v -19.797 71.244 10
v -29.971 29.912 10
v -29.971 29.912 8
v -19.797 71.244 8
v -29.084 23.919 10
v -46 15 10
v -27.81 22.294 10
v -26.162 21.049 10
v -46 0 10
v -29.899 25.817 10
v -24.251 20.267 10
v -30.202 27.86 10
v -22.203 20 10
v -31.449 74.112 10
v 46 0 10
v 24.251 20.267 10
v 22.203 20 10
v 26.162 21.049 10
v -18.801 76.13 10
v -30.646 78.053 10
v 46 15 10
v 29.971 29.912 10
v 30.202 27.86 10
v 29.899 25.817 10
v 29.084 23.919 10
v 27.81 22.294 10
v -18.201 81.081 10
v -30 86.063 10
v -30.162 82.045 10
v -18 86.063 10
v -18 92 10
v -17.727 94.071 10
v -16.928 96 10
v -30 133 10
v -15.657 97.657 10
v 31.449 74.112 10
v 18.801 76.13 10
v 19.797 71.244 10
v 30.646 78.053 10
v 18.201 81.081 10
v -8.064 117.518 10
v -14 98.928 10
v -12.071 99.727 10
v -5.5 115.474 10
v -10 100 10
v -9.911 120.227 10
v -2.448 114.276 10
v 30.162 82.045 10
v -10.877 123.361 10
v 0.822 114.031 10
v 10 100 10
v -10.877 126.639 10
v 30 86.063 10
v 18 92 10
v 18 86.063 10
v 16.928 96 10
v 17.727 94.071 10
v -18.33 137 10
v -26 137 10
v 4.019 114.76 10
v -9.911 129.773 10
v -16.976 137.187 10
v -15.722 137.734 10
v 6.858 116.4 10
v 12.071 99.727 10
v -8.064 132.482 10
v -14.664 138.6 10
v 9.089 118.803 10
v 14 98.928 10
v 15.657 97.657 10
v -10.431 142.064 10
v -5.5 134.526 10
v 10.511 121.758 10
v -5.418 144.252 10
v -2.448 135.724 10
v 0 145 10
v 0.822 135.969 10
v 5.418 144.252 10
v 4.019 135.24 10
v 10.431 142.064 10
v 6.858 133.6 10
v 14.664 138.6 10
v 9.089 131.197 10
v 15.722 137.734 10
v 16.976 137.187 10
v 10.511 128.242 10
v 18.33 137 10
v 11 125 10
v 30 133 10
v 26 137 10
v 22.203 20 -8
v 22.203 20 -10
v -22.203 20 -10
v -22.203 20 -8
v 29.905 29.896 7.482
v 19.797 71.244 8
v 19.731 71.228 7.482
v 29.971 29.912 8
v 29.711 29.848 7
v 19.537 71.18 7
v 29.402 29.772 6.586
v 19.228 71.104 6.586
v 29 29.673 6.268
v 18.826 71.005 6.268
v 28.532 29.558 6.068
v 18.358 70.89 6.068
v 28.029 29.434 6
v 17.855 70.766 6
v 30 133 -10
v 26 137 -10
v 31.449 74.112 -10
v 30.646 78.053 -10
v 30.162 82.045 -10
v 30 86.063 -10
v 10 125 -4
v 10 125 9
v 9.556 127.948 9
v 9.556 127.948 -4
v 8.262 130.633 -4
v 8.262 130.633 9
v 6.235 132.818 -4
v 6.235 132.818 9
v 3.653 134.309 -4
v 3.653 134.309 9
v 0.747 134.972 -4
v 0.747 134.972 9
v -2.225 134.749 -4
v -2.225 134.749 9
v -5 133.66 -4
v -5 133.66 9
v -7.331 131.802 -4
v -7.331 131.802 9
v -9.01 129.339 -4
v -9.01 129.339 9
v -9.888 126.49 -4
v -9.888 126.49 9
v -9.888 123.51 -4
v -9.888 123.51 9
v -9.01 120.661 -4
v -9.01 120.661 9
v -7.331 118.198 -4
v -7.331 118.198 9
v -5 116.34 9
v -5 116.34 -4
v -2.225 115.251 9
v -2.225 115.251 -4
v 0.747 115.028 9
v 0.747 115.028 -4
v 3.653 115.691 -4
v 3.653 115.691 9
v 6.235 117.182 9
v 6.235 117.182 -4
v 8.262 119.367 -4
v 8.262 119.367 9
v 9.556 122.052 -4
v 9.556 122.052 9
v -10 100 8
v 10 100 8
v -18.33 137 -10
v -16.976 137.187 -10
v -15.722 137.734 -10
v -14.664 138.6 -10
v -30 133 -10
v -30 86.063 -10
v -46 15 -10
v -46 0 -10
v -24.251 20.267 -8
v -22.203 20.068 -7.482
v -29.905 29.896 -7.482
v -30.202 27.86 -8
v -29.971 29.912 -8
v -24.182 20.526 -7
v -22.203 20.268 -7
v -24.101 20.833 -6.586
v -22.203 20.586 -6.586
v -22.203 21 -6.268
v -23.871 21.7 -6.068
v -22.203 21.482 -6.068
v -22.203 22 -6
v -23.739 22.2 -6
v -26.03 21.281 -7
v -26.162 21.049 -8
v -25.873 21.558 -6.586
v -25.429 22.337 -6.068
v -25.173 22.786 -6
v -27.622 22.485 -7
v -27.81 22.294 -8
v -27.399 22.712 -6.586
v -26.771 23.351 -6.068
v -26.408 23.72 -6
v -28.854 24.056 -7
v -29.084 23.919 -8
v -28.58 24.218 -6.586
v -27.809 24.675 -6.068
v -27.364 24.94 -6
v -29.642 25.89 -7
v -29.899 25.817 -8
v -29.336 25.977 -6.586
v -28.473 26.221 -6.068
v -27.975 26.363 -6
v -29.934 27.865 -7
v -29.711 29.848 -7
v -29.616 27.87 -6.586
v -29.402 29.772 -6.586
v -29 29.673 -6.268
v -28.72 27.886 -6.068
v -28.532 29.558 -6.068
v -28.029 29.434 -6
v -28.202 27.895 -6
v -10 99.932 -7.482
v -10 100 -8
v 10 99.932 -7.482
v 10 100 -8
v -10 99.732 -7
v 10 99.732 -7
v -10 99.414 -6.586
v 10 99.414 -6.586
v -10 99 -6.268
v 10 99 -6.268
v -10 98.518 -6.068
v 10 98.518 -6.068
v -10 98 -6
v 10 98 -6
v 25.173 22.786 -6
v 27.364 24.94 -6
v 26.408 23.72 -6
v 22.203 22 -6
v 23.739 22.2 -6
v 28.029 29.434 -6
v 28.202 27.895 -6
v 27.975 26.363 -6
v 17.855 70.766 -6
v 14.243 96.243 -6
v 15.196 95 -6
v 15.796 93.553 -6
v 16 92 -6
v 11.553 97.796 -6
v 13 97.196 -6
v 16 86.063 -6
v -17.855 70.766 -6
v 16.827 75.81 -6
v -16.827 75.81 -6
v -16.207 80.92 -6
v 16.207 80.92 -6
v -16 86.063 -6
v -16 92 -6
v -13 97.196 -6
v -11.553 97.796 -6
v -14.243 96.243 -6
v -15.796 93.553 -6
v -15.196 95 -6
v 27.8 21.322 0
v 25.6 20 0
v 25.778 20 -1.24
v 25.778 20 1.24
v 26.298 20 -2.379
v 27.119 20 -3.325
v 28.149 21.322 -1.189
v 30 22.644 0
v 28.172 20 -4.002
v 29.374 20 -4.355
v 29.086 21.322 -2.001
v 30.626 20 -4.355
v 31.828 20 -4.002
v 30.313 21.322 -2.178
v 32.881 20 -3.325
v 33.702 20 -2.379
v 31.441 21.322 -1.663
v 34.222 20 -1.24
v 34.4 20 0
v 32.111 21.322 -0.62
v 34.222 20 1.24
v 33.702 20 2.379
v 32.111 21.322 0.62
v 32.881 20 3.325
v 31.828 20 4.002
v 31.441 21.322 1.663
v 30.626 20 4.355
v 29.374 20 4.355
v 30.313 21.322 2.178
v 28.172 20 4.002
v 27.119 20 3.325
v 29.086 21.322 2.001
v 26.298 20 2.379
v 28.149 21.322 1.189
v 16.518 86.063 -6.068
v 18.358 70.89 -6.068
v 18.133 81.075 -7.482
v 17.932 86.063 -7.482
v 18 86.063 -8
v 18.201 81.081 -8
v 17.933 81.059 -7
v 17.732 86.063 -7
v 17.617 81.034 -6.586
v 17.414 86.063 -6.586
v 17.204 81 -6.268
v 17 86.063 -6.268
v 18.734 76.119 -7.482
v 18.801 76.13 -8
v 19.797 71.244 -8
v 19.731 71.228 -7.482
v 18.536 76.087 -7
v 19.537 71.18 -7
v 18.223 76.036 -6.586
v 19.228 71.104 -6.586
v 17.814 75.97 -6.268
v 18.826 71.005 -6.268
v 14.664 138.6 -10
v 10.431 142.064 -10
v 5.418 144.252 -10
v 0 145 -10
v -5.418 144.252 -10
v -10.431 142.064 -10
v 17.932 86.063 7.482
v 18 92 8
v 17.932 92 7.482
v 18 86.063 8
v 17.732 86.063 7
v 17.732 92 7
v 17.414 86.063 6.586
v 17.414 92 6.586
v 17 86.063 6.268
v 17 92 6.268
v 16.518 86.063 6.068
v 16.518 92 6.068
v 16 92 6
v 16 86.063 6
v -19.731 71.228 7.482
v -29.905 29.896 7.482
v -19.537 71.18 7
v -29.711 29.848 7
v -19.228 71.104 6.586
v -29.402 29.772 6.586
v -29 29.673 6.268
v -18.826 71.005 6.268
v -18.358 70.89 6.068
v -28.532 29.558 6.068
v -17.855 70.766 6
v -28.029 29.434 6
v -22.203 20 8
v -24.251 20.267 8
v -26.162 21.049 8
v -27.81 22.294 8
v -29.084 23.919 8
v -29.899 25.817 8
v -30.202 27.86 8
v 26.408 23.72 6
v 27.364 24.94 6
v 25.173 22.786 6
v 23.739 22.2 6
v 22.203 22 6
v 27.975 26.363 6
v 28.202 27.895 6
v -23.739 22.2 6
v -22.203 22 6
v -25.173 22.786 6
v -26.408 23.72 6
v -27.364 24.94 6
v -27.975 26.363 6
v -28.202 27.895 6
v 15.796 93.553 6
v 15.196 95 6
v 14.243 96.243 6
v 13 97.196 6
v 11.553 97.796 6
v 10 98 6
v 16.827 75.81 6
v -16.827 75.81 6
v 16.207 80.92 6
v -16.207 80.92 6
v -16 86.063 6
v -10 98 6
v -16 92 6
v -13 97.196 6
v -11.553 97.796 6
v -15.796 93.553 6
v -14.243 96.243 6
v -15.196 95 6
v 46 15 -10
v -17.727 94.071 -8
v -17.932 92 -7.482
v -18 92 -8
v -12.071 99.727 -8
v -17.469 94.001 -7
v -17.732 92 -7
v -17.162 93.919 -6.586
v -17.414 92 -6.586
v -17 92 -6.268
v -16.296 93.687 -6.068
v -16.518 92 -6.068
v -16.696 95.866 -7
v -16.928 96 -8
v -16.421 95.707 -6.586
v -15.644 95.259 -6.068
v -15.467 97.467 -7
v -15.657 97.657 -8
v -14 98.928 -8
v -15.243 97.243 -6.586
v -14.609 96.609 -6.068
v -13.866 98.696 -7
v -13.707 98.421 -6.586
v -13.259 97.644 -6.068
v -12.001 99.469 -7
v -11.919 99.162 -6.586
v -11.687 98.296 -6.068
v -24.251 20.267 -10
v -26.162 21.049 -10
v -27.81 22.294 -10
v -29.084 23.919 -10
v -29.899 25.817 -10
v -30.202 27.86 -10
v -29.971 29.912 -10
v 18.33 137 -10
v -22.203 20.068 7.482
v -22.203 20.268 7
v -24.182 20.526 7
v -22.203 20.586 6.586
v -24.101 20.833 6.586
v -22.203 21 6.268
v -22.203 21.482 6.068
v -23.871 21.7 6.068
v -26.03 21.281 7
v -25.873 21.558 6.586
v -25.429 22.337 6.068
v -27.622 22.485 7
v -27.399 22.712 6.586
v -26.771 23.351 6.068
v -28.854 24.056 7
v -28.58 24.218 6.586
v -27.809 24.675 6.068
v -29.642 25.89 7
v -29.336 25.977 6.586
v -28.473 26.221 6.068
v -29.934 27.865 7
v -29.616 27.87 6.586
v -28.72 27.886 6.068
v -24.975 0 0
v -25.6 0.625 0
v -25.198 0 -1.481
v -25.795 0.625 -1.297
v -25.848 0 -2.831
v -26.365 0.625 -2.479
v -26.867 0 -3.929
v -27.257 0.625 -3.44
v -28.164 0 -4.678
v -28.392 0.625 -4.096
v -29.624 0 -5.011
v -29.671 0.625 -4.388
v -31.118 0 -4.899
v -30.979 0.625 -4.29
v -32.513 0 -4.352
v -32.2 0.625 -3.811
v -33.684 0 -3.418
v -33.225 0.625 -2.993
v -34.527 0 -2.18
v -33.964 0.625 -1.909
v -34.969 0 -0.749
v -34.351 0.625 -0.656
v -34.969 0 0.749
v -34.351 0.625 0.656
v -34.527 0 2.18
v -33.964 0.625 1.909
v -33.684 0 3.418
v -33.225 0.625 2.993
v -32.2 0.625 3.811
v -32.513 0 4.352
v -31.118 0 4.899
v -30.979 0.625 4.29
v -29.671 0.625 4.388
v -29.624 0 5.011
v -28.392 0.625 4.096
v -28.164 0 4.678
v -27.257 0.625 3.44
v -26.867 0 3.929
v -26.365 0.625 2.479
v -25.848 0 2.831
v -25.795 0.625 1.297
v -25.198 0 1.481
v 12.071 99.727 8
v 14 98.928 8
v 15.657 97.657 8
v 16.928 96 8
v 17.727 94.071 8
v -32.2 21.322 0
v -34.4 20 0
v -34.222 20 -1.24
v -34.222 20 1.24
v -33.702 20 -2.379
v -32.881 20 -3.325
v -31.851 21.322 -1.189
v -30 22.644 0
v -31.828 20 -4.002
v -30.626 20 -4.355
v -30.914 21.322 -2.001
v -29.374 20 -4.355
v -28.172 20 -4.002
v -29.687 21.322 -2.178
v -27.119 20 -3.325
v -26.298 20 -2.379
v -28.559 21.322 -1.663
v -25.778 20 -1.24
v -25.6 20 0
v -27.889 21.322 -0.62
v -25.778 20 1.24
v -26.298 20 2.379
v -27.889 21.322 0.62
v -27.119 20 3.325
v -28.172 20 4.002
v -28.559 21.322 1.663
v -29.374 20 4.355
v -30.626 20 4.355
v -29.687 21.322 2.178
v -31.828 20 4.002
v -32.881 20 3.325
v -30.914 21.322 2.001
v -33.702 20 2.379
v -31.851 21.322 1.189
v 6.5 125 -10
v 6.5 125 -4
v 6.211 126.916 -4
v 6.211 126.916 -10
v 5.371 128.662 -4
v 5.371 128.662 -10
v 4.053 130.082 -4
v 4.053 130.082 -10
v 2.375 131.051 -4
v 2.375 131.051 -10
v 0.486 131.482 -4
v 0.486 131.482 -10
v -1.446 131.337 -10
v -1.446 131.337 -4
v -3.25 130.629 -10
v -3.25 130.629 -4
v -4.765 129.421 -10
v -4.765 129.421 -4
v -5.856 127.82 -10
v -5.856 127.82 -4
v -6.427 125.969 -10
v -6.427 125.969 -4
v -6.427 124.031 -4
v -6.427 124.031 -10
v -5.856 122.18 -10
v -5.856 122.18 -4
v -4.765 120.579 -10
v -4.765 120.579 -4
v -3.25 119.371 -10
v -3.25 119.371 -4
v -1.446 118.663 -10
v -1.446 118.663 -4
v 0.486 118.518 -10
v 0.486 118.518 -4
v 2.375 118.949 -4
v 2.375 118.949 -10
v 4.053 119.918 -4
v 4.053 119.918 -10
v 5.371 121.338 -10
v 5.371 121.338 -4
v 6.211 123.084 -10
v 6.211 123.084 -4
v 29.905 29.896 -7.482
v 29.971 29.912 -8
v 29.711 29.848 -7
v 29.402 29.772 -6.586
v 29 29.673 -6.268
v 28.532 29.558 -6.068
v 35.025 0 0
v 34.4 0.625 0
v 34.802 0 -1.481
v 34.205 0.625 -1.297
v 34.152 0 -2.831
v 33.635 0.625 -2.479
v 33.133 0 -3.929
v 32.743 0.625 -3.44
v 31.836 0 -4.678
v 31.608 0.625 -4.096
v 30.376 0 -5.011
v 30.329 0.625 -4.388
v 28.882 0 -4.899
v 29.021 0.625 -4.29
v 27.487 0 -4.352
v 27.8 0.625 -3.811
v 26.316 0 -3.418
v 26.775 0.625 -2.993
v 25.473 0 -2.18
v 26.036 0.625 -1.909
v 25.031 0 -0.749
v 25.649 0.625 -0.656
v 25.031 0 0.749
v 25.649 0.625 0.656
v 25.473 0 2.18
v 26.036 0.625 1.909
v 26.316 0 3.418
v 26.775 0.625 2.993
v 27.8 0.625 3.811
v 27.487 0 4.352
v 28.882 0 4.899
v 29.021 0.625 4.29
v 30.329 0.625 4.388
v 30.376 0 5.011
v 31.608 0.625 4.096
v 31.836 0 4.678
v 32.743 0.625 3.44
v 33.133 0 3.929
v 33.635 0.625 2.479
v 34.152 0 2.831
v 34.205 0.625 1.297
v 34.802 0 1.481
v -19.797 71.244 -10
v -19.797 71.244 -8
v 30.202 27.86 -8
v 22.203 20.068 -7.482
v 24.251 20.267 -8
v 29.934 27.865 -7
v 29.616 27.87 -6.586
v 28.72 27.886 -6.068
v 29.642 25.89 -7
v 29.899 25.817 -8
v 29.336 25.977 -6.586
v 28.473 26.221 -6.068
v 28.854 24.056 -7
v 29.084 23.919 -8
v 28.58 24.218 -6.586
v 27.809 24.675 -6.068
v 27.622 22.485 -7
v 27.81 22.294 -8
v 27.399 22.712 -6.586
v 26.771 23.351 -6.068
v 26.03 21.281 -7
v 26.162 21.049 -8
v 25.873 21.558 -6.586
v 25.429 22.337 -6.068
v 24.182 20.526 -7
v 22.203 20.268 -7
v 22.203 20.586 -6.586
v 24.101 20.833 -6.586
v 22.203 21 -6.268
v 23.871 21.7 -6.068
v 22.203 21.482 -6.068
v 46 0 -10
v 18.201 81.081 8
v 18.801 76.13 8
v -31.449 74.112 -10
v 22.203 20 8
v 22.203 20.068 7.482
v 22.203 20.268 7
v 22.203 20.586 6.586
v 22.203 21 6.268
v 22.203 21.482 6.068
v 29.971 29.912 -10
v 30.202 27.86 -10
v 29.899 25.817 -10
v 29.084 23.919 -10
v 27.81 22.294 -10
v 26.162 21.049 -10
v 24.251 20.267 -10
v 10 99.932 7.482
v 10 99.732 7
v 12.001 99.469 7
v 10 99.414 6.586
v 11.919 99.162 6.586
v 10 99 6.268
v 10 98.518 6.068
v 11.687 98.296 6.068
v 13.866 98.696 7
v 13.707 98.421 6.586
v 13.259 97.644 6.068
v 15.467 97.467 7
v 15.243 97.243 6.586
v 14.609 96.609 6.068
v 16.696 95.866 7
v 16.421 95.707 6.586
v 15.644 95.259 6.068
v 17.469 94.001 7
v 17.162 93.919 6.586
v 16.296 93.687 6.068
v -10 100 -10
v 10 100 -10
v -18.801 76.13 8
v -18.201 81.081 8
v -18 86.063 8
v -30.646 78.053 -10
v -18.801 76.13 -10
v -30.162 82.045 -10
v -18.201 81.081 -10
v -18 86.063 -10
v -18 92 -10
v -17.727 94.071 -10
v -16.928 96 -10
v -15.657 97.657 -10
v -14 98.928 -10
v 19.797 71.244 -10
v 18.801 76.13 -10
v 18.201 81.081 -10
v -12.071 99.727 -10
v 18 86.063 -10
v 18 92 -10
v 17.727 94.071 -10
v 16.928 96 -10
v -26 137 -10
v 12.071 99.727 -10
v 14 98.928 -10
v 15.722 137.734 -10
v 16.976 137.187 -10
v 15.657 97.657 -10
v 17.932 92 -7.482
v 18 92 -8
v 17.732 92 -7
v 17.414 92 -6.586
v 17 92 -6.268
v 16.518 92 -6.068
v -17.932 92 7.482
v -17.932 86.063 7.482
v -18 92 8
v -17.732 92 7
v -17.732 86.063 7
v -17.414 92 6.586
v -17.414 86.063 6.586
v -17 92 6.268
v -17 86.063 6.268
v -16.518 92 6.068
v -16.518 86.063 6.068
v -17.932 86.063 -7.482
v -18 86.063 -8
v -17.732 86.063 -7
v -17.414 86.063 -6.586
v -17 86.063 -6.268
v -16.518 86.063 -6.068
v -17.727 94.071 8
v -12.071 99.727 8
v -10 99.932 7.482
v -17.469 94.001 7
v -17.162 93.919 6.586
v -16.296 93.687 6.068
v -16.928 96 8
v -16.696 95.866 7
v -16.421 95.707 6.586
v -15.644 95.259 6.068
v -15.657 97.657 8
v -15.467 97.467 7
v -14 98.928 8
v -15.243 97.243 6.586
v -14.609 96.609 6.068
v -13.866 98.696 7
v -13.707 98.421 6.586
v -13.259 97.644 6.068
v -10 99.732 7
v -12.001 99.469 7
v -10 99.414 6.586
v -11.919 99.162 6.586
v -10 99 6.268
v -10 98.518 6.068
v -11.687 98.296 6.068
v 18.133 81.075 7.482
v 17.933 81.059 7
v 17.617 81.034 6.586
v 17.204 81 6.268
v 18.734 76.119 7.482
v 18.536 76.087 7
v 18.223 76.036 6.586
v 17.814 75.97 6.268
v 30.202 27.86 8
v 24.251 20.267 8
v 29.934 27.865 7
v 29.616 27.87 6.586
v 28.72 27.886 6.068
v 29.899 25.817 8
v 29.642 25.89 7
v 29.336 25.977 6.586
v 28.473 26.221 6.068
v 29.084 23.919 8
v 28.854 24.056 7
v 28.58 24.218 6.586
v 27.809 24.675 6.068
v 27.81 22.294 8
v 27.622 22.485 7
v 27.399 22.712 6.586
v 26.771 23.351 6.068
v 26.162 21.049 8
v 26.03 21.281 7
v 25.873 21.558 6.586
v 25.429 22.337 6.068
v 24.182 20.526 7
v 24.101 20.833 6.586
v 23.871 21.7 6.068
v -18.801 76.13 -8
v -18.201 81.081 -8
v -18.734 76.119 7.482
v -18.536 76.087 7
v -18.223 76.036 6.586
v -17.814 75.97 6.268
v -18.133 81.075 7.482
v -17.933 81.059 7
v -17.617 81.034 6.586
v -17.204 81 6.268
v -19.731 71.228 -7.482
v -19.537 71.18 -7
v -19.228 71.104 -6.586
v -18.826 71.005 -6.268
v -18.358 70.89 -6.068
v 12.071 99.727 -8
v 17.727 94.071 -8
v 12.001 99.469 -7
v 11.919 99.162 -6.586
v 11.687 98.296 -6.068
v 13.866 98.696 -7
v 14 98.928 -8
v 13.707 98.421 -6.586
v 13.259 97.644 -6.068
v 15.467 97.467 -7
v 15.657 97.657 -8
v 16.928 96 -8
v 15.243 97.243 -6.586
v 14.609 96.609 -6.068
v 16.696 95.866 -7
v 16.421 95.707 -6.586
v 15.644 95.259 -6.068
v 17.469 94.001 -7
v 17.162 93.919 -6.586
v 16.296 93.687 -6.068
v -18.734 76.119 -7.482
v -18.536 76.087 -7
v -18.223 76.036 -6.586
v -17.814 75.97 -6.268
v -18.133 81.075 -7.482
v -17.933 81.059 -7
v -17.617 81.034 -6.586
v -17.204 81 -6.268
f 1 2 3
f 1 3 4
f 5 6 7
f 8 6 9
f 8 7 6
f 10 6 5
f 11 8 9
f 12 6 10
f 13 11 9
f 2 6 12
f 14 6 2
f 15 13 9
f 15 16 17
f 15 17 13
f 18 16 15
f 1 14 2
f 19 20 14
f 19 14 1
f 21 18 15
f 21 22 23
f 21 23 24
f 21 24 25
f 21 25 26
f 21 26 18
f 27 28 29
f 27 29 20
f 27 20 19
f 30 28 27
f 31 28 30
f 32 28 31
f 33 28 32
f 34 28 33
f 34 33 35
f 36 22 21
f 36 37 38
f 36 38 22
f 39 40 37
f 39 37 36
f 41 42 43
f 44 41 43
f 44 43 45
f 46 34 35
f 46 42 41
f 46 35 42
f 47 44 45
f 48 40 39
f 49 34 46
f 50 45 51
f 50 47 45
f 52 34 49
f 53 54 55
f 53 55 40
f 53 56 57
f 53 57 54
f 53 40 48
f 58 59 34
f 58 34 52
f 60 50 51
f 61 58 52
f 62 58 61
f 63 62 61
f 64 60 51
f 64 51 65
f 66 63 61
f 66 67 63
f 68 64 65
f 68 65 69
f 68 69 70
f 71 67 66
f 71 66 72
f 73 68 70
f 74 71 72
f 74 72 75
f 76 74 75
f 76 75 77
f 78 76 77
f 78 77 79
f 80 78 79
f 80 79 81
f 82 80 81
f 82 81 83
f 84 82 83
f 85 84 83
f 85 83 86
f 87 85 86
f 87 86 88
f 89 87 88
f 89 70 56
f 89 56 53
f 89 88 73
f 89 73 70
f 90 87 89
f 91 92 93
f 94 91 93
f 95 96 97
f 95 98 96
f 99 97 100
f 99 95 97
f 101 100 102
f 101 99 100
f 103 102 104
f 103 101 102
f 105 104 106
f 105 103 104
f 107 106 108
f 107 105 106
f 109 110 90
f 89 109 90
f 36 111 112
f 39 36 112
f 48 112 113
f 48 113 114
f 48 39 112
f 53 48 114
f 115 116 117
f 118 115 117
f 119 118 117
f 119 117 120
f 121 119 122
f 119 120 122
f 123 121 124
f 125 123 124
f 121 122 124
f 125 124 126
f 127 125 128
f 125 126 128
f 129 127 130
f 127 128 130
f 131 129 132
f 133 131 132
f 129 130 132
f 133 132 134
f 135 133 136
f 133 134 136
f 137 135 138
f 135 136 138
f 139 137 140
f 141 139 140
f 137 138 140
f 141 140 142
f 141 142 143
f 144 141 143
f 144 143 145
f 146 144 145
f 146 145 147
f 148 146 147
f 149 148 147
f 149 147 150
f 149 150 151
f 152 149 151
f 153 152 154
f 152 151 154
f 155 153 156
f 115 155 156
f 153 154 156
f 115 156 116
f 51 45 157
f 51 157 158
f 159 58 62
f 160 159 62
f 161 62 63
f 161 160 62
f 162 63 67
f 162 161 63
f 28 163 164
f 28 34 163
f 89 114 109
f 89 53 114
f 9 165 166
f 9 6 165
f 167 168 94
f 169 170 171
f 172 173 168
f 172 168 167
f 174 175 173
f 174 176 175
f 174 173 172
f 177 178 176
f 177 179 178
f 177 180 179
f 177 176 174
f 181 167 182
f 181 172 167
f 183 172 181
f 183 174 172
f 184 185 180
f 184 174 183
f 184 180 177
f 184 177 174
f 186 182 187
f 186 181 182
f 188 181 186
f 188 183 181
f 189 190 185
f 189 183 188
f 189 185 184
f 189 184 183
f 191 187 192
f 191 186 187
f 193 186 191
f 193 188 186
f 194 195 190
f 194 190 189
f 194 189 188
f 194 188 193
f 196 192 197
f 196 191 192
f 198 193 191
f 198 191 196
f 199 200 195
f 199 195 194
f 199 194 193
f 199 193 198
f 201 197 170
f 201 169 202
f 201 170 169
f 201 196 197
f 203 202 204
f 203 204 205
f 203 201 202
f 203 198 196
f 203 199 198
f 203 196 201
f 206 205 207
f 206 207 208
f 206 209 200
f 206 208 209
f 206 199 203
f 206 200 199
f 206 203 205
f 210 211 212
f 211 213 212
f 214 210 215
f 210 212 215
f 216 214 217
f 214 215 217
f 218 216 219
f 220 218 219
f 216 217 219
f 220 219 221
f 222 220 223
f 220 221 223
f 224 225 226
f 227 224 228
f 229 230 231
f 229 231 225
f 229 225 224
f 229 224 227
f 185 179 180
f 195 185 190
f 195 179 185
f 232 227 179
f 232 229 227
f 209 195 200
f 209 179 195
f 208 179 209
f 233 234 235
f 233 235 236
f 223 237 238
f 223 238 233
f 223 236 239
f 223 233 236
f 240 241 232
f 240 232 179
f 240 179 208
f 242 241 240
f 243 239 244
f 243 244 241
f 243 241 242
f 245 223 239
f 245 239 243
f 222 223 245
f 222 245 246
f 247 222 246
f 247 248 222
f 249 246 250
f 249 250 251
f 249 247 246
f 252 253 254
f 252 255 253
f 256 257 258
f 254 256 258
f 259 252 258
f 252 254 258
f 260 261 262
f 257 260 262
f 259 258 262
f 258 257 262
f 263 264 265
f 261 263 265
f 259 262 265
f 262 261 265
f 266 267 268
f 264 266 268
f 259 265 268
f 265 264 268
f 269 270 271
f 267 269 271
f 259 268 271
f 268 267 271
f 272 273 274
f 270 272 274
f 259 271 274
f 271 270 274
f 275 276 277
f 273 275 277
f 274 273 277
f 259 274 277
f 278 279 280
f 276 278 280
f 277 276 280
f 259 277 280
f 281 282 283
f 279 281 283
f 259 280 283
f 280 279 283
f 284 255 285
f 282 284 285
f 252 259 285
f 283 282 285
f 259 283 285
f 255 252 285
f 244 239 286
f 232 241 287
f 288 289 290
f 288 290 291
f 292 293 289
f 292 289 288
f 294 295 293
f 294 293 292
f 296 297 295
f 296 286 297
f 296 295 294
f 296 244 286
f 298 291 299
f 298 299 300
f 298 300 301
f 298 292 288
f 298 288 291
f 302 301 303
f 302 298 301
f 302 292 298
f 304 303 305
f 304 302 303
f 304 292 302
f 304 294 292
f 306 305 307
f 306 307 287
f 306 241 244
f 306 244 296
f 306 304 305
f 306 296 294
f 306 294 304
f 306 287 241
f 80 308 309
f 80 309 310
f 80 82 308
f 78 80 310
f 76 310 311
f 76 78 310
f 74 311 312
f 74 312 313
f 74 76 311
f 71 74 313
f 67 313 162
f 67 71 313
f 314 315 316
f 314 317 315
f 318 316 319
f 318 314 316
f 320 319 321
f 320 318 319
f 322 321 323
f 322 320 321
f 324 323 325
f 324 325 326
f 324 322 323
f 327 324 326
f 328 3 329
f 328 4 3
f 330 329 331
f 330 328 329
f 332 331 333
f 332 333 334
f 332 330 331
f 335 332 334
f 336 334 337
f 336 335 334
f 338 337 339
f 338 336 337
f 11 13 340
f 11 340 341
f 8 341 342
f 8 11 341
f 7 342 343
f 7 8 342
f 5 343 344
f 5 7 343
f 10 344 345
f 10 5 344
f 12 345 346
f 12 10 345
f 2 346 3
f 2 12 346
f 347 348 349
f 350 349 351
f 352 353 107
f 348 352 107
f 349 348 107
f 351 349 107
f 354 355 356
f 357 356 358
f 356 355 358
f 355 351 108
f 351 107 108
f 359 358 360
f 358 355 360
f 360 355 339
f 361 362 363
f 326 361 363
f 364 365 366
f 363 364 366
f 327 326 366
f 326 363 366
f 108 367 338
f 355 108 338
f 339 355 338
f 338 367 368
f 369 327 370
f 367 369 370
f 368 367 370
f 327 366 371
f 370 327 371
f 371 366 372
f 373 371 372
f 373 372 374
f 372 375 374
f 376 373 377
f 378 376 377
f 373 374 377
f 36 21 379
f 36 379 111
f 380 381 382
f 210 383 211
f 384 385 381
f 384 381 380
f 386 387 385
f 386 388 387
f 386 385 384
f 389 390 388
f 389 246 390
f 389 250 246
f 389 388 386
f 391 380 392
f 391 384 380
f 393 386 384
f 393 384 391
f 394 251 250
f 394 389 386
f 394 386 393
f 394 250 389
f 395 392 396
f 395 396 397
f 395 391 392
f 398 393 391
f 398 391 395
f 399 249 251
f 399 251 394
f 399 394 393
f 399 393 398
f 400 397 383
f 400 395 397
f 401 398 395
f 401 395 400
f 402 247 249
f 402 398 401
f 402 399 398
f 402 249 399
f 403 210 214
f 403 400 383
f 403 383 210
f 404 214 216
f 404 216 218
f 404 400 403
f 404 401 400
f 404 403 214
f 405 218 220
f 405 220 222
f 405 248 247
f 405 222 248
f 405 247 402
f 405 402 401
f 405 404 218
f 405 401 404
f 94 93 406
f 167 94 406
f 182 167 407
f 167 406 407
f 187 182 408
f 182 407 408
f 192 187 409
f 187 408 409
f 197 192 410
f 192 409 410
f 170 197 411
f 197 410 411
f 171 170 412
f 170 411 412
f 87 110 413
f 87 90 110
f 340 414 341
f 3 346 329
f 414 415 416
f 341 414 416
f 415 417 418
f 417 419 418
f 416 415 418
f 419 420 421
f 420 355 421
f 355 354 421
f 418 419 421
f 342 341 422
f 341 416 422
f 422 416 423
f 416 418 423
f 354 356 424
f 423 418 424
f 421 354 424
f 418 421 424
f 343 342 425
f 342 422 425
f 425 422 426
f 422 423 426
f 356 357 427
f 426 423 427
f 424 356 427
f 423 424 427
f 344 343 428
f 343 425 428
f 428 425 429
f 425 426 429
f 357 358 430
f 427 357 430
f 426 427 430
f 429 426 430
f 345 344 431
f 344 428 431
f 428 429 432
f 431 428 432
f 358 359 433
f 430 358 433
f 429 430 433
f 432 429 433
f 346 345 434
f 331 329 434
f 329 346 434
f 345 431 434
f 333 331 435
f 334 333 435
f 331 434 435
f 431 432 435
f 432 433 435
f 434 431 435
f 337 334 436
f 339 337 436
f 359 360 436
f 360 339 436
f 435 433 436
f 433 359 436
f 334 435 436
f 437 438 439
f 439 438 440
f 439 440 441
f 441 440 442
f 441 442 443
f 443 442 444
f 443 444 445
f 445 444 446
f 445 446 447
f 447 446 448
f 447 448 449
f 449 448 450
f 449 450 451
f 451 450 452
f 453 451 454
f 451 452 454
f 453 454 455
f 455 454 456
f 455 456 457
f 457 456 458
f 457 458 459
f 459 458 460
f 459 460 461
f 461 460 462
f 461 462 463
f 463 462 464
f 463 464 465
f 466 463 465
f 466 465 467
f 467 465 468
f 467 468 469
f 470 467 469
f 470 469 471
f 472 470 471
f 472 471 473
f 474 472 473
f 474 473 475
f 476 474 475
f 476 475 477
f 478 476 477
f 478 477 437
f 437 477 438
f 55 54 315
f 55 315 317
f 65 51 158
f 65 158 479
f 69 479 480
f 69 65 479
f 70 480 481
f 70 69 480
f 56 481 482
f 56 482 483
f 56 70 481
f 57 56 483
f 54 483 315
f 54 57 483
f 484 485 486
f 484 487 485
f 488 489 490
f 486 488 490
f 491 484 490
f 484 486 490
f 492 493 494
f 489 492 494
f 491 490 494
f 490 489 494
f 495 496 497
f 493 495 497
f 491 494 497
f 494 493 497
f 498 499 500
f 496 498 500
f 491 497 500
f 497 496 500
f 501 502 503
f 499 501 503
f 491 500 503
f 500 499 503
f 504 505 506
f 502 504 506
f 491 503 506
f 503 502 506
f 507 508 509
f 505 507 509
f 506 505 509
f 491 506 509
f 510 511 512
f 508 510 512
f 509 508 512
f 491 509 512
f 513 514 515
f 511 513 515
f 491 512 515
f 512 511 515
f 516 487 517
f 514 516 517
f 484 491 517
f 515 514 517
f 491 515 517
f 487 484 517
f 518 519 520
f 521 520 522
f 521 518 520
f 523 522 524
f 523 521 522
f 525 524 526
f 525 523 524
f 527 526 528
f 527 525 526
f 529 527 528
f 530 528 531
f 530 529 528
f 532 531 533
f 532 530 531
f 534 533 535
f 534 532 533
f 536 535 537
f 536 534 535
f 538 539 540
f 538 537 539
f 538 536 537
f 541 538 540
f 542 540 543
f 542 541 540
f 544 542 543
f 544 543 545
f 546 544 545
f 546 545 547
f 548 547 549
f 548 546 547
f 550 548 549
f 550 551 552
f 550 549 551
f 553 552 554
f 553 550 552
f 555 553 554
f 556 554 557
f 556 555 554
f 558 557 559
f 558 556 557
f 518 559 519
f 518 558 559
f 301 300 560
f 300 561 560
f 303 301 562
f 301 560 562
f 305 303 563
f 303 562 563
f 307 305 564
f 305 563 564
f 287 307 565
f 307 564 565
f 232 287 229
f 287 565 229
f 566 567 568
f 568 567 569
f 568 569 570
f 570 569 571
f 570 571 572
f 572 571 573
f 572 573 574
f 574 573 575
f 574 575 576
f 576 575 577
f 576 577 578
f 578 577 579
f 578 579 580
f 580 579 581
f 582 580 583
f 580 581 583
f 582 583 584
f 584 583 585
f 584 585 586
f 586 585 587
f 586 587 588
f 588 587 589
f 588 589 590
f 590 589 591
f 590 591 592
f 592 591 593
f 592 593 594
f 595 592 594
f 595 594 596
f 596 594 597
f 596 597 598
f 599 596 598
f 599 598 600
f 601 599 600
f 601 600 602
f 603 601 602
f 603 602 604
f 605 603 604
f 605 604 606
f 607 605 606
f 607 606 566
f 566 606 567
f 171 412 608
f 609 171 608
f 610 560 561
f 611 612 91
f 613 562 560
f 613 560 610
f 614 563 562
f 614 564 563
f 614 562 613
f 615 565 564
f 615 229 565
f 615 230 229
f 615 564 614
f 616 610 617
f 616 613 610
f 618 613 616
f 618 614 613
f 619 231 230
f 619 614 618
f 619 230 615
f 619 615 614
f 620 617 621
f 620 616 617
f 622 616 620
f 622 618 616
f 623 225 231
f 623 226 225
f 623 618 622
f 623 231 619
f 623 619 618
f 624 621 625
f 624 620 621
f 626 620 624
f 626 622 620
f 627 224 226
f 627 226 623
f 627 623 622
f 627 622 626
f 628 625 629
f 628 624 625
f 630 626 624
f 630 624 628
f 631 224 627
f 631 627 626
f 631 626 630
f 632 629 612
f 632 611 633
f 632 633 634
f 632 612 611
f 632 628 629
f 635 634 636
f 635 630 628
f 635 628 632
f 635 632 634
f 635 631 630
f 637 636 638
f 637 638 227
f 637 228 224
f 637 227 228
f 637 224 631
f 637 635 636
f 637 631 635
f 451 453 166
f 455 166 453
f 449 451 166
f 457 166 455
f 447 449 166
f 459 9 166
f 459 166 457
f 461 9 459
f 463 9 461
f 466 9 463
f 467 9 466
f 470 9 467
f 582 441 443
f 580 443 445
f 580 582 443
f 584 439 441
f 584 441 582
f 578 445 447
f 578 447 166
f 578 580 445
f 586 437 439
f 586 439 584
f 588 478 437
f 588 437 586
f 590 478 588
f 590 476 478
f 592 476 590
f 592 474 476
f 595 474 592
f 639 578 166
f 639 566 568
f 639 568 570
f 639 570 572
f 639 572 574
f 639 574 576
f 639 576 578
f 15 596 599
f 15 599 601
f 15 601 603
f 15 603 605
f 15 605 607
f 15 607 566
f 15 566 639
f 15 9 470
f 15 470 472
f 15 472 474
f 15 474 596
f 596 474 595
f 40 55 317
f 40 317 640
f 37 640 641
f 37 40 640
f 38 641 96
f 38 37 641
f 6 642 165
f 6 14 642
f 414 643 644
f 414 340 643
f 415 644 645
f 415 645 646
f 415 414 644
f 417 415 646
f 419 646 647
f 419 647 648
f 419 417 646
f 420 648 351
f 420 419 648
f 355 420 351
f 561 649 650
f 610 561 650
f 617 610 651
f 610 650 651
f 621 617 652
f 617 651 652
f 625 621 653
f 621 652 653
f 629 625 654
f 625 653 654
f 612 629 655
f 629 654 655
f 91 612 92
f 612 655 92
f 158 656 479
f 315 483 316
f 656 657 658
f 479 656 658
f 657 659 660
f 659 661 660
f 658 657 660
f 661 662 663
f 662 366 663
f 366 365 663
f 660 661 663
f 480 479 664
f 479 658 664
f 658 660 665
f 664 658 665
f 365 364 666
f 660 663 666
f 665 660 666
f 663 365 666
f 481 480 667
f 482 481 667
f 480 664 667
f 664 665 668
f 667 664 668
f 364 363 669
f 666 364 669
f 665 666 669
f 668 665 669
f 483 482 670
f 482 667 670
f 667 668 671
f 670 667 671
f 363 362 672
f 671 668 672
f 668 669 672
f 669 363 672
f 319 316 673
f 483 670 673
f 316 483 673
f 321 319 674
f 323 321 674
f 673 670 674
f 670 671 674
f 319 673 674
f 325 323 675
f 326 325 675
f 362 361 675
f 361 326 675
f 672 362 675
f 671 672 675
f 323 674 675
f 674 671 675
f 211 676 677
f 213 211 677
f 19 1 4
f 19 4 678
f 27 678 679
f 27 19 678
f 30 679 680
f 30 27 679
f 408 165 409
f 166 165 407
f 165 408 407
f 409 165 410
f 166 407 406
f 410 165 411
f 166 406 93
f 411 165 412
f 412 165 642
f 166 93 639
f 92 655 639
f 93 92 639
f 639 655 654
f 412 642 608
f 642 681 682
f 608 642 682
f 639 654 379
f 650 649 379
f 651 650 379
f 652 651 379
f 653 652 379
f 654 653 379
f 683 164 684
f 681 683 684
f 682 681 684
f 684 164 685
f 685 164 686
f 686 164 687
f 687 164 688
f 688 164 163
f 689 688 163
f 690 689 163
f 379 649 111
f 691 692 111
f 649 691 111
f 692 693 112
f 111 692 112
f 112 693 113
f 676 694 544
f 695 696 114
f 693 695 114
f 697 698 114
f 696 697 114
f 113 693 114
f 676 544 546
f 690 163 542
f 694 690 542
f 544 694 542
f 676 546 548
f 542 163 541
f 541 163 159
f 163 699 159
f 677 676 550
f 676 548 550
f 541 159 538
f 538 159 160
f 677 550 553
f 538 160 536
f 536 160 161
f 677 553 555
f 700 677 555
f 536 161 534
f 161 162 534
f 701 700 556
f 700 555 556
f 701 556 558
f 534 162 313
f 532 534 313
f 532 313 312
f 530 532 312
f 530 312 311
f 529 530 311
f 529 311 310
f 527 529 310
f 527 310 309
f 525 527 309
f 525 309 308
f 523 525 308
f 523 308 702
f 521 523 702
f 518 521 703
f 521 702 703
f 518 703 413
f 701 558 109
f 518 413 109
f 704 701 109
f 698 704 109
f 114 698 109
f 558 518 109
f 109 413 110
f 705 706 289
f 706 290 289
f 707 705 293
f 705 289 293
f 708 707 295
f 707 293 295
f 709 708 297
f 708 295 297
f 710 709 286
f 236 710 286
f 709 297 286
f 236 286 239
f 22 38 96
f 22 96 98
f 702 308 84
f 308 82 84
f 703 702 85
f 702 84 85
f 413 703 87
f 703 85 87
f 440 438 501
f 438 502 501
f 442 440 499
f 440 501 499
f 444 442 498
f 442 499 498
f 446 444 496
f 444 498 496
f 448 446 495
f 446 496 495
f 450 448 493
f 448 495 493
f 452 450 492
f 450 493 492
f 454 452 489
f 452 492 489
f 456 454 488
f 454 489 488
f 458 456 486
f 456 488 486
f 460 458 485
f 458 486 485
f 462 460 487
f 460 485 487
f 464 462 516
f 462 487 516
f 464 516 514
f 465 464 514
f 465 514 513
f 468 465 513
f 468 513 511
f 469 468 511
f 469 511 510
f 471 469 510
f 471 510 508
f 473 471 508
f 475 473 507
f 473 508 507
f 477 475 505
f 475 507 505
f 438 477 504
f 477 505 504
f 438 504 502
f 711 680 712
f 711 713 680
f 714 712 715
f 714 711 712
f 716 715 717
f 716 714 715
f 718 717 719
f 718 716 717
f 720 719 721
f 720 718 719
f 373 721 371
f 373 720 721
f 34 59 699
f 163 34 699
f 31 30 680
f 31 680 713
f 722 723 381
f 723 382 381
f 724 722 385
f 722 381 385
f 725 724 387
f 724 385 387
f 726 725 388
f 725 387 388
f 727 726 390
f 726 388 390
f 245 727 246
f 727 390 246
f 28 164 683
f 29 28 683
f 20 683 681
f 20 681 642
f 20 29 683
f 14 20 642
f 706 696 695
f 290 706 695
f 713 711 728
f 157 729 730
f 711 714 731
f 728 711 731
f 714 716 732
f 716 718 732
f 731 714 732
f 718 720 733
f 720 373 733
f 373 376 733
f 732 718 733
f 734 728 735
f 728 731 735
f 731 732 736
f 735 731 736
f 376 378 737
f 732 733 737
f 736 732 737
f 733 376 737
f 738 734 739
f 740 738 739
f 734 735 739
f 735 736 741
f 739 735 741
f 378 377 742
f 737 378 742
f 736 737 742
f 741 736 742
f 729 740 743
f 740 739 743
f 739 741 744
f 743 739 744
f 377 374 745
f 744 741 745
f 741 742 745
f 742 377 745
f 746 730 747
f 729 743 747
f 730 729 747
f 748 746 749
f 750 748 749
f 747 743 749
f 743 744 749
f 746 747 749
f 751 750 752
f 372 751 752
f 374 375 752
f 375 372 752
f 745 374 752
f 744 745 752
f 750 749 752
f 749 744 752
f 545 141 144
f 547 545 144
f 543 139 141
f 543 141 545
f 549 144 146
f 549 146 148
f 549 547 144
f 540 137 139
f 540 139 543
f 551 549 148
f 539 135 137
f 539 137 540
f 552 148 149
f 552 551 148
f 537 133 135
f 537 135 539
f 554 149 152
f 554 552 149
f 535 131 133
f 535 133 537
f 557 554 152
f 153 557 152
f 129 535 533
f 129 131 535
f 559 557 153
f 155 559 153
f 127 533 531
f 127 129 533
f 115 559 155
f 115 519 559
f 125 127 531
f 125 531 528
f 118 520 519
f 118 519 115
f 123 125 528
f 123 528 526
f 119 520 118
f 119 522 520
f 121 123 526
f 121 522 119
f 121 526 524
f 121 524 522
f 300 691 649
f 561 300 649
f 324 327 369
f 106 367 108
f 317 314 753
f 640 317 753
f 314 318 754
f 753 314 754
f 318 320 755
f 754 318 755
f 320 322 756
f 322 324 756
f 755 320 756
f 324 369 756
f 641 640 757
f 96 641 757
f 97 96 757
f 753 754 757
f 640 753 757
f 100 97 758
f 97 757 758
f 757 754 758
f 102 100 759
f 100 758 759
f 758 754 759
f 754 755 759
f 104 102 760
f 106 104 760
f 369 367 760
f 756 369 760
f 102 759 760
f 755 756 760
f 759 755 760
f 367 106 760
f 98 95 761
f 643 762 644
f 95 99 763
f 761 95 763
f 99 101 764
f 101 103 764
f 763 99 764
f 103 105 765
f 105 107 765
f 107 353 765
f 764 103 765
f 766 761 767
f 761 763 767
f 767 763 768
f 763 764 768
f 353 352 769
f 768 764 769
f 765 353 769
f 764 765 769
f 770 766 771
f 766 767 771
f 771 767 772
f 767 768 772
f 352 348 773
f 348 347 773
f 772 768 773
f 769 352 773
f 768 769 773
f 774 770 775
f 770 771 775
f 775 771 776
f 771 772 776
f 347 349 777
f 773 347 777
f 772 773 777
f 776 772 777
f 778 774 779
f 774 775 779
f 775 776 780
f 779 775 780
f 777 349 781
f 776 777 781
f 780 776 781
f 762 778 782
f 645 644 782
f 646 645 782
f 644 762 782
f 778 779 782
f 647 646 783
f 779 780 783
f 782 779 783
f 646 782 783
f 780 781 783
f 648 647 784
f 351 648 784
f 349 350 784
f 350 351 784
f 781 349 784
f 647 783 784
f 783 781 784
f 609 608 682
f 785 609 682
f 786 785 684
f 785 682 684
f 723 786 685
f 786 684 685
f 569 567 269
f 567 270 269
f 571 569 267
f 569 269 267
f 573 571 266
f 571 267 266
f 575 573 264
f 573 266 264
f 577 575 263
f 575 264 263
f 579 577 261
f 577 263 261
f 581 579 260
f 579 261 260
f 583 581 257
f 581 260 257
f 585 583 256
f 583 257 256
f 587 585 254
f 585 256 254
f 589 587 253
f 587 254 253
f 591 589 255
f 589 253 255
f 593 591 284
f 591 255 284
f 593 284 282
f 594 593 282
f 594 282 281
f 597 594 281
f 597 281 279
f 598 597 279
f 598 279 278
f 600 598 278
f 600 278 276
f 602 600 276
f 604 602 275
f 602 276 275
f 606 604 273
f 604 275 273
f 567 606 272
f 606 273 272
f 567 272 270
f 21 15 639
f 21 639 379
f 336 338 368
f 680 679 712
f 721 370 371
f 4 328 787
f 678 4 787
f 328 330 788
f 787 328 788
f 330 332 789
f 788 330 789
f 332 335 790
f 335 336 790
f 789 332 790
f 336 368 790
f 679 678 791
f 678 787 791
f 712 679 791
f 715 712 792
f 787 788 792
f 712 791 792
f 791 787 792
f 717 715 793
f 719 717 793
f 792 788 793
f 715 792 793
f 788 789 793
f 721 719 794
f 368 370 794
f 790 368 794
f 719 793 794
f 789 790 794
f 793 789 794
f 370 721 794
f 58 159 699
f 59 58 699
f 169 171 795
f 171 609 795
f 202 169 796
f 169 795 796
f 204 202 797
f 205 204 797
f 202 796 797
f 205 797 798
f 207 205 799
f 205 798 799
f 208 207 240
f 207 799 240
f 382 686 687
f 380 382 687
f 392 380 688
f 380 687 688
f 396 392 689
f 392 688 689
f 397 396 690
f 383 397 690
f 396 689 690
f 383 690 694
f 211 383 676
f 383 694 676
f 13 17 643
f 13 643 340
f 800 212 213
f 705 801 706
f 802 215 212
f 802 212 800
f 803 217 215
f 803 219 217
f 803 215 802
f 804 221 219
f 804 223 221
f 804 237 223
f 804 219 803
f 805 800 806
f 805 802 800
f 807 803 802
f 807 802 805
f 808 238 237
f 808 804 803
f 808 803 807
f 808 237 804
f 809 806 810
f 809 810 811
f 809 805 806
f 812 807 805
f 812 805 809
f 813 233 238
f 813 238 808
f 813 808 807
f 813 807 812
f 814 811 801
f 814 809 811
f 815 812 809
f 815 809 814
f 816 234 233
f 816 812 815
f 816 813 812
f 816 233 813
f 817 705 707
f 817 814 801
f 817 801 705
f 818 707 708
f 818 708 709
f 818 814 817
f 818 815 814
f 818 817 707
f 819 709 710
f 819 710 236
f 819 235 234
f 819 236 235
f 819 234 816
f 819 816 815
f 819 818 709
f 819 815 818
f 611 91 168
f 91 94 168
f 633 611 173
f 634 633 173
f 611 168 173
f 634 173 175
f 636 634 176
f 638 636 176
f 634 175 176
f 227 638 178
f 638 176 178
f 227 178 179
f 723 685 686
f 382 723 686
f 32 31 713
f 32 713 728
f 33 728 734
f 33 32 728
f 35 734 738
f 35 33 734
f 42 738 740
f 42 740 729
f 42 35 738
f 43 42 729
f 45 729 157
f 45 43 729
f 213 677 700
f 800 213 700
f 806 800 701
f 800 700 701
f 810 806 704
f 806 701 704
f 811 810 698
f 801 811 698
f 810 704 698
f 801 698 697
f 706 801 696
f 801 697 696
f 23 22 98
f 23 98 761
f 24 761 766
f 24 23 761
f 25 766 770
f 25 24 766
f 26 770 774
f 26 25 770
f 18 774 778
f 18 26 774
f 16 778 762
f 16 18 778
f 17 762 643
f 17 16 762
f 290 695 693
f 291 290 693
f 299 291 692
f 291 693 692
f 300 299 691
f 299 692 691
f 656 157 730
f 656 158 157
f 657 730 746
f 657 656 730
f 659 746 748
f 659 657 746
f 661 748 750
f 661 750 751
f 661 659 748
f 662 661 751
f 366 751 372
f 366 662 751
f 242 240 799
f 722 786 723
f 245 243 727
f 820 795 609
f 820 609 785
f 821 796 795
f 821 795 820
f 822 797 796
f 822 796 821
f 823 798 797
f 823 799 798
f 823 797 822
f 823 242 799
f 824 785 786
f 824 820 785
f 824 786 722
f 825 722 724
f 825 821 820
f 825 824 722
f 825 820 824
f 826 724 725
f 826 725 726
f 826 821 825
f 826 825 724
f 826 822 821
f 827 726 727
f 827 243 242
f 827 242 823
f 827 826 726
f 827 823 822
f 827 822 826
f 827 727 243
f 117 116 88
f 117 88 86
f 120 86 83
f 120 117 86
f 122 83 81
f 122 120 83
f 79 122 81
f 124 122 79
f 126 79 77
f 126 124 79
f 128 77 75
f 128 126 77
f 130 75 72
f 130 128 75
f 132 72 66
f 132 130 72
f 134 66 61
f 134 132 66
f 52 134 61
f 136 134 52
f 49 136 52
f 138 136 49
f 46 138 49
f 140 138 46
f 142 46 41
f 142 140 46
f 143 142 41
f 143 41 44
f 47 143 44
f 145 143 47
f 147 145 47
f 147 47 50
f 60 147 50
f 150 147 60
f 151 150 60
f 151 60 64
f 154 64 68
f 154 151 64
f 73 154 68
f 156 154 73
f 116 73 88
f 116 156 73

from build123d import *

# Parameters (mm, degrees)
SKETCH1_R                         = 6.5
BOSS_EXTRUDE1_DEPTH               = 10
SKETCH2_R                         = 10
CUT_EXTRUDE1_DEPTH                = 14
CHAMFER1_SIZE                     = 1
CHAMFER2_SIZE                     = 4
FILLET1_R                         = 5
CUT_EXTRUDE2_DEPTH                = 4
FILLET2_R                         = 2
FILLET2_OF_MIRROR2_R              = 2
M10X1_25_TAPPED_HOLE1_D           = 8.8
M10X1_25_TAPPED_HOLE1_DEPTH       = 20
M10X1_25_TAPPED_HOLE1_CSINK_D     = 10.05
M10X1_25_TAPPED_HOLE1_CSINK_ANGLE = 90
M10X1_25_TAPPED_HOLE1_TIP         = 2.643786724


with BuildPart() as part:
    # Sketch1 → Boss-Extrude1 (new, symmetric)
    with BuildSketch(Plane.XY):
        with BuildLine():
            Line((-46, 0), (46, 0))
            Line((46, 0), (46, 15))
            Line((46, 15), (31.449256053, 74.112397284))
            ThreePointArc((31.449256053, 74.112397284), (30.363636327, 80.044097084), (30, 86.06334964))
            Line((30, 86.06334964), (30, 137))
            Line((30, 137), (16, 137))
            ThreePointArc((16, 137), (0, 145), (-16, 137))
            Line((-16, 137), (-30, 137))
            Line((-30, 137), (-30, 86.06334964))
            ThreePointArc((-30, 86.06334964), (-30.363636327, 80.044097084), (-31.449256053, 74.112397284))
            Line((-31.449256053, 74.112397284), (-46, 15))
            Line((-46, 15), (-46, 0))
        make_face()
        with Locations((0, 125)):
            Circle(SKETCH1_R, mode=Mode.SUBTRACT)
    extrude(amount=BOSS_EXTRUDE1_DEPTH, both=True)

    # Sketch2 → Cut-Extrude1 (cut)
    with BuildSketch(Plane.XY.offset(10)):
        with Locations((0, 125)):
            Circle(SKETCH2_R)
    extrude(amount=-CUT_EXTRUDE1_DEPTH, mode=Mode.SUBTRACT)

    # Chamfer1
    chamfer1_edges = [part.edges().sort_by_distance(p)[0] for p in [
        (-10, 125, 10),
    ]]
    chamfer(chamfer1_edges, length=CHAMFER1_SIZE)

    # Chamfer2
    chamfer2_edges = [part.edges().sort_by_distance(p)[0] for p in [
        (-30, 137, 0),
        (30, 137, 0),
    ]]
    chamfer(chamfer2_edges, length=CHAMFER2_SIZE)

    # Fillet1
    fillet1_edges = [part.edges().sort_by_distance(p)[0] for p in [
        (-16, 137, 0),
        (16, 137, 0),
    ]]
    fillet(fillet1_edges, radius=FILLET1_R)

    # Sketch10 → Cut-Extrude2 (cut)
    with BuildSketch(Plane.XY.offset(10)):
        with BuildLine():
            ThreePointArc((18, 86.06334964), (18.450909046, 78.59947647), (19.797077506, 71.244168718))
            Line((19.797077506, 71.244168718), (29.971112298, 29.912152377))
            ThreePointArc((29.971112298, 29.912152377), (28.49970745, 23.065287193), (22.202993266, 20))
            Line((22.202993266, 20), (-22.202993266, 20))
            ThreePointArc((-22.202993266, 20), (-28.49970745, 23.065287193), (-29.971112298, 29.912152377))
            Line((-29.971112298, 29.912152377), (-19.797077506, 71.244168718))
            ThreePointArc((-19.797077506, 71.244168718), (-18.450909046, 78.59947647), (-18, 86.06334964))
            Line((-18, 86.06334964), (-18, 92))
            ThreePointArc((-18, 92), (-15.656854249, 97.656854249), (-10, 100))
            Line((-10, 100), (10, 100))
            ThreePointArc((10, 100), (15.656854249, 97.656854249), (18, 92))
            Line((18, 92), (18, 86.06334964))
        make_face()
    cut_extrude2 = extrude(amount=-CUT_EXTRUDE2_DEPTH, mode=Mode.SUBTRACT)

    # Fillet2
    fillet2_edges = [part.edges().sort_by_distance(p)[0] for p in [
        (-24.884094902, 50.578160548, 6),
        (-18, 89.03167482, 6),
        (15.656854249, 97.656854249, 6),
        (18, 89.03167482, 6),
        (18.450909046, 78.59947647, 6),
        (-28.49970745, 23.065287193, 6),
        (-18.450909046, 78.59947647, 6),
        (-15.656854249, 97.656854249, 6),
        (0, 100, 6),
        (24.884094902, 50.578160548, 6),
        (28.49970745, 23.065287193, 6),
        (0, 20, 6),
    ]]
    fillet(fillet2_edges, radius=FILLET2_R)

    # Mirror2: Cut-Extrude2 across plane
    add(cut_extrude2.mirror(Plane.XY), mode=Mode.SUBTRACT)

    # Fillet2 of Mirror2
    fillet2_of_mirror2_edges = [part.edges().sort_by_distance(p)[0] for p in [
        (-24.884094902, 50.578160548, -6),
        (-18, 89.03167482, -6),
        (15.656854249, 97.656854249, -6),
        (18, 89.03167482, -6),
        (18.450909046, 78.59947647, -6),
        (-28.49970745, 23.065287193, -6),
        (-18.450909046, 78.59947647, -6),
        (-15.656854249, 97.656854249, -6),
        (0, 100, -6),
        (24.884094902, 50.578160548, -6),
        (28.49970745, 23.065287193, -6),
        (0, 20, -6),
    ]]
    fillet(fillet2_of_mirror2_edges, radius=FILLET2_OF_MIRROR2_R)

    # M10x1.25 Tapped Hole1
    with Locations(Plane(origin=(0, 0, 0), x_dir=(-1, 0, 0), z_dir=(0, -1, 0))):
        with Locations((-30, 0), (30, 0)):
            CounterSinkHole(M10X1_25_TAPPED_HOLE1_D / 2, M10X1_25_TAPPED_HOLE1_CSINK_D / 2, depth=M10X1_25_TAPPED_HOLE1_DEPTH, counter_sink_angle=M10X1_25_TAPPED_HOLE1_CSINK_ANGLE)
            with Locations((0, 0, -(M10X1_25_TAPPED_HOLE1_DEPTH + M10X1_25_TAPPED_HOLE1_TIP / 2))):  # 118° drill point
                Cone(0, M10X1_25_TAPPED_HOLE1_D / 2, M10X1_25_TAPPED_HOLE1_TIP, mode=Mode.SUBTRACT)


solid = part.part
